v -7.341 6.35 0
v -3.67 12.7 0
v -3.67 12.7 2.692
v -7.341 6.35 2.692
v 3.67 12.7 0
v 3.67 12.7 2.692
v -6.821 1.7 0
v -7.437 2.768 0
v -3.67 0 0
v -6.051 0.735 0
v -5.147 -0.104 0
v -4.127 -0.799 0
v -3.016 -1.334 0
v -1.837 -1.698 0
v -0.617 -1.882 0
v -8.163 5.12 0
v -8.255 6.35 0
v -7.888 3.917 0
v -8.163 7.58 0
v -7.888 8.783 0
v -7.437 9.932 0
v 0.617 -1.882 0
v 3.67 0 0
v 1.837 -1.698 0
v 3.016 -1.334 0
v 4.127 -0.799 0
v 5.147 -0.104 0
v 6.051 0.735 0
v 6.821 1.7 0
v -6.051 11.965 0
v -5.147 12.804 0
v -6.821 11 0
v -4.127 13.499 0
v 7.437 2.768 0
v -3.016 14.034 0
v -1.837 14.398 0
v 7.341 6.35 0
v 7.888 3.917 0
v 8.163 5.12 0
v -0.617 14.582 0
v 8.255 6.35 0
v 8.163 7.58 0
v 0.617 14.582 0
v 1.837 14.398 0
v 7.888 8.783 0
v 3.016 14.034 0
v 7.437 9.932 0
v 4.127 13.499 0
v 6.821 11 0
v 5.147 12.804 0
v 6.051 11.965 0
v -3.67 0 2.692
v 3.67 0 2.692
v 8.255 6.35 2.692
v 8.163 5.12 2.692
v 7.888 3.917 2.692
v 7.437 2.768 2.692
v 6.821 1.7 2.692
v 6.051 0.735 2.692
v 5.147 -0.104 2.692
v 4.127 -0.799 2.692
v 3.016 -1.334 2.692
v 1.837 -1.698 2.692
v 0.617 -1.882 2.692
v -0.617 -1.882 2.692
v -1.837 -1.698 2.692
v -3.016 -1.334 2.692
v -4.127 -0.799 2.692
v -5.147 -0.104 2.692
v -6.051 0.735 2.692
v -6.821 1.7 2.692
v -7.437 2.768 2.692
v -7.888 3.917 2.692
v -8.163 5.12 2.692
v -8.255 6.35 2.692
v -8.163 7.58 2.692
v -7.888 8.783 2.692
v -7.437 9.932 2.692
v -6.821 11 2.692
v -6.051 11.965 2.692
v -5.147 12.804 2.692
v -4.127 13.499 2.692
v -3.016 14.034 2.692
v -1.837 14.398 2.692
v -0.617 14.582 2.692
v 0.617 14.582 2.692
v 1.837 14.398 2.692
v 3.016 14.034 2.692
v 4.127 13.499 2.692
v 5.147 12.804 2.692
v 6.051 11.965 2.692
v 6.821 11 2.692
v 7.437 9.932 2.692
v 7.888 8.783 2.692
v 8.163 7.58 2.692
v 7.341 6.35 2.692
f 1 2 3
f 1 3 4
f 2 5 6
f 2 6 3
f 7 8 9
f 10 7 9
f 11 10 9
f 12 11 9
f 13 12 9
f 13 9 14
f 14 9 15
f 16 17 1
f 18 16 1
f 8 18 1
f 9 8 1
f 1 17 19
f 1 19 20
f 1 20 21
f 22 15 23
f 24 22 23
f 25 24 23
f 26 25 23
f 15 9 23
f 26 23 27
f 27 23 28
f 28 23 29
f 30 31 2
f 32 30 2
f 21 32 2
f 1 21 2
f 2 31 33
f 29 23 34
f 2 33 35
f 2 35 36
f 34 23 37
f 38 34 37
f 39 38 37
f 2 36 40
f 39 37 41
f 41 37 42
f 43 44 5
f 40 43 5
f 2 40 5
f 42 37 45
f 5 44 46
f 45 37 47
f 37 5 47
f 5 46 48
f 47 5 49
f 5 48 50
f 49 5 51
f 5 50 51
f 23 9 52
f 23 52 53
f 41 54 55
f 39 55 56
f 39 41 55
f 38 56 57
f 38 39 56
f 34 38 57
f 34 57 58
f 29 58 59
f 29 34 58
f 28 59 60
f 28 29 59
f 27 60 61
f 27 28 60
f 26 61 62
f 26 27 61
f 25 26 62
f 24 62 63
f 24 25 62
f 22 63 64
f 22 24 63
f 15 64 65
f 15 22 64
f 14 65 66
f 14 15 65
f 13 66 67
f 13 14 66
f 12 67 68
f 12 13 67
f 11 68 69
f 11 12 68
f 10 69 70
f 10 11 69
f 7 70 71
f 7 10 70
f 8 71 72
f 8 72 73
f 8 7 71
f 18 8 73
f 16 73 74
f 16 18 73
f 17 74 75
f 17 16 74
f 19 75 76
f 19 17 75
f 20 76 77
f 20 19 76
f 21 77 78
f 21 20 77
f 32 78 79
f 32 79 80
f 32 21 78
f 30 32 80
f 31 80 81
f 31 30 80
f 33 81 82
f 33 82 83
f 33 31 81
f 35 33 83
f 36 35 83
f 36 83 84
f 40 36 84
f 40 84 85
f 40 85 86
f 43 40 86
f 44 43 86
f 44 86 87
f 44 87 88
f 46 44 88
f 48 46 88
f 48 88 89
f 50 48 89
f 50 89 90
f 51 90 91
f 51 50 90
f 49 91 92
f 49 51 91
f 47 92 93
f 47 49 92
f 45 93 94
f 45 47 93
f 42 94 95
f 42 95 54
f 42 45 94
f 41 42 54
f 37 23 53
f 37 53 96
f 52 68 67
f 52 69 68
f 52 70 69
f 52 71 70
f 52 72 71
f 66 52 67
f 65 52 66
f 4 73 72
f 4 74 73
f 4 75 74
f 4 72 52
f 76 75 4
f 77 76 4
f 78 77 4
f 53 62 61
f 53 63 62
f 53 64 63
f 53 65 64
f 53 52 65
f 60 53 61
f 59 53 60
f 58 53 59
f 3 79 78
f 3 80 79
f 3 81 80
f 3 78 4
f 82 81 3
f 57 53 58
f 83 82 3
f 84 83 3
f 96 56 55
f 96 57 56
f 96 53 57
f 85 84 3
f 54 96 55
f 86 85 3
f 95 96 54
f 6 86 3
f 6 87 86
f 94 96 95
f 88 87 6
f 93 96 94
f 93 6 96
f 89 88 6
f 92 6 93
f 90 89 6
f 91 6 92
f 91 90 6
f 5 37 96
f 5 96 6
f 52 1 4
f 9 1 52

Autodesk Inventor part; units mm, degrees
ref_plane "YZ Plane" through (0, 0, 0) normal (1, 0, 0) x (0, 1, 0)
ref_plane "XZ Plane" through (0, 0, 0) normal (0, 1, 0) x (-1, 0, 0)
ref_plane "XY Plane" through (0, 0, 0) normal (0, 0, 1) x (1, 0, 0)
sketch "Sketch2" plane through (0, 0, 0) normal (0, 0, 1) x (1, 0, 0)
  line L0 (0, 12.7) -> (3.6703, 12.7)
  line L1 (0, 12.7) -> (-3.6703, 12.7)
  line L2 (0, 0) -> (3.6703, 0)
  line L3 (0, 0) -> (-3.6703, 0)
  line L4 (-3.6703, 0) -> (-7.3406, 6.35)
  line L5 (-7.3406, 6.35) -> (-3.6703, 12.7)
  line L6 (3.6703, 12.7) -> (7.3406, 6.35)
  line L7 (7.3406, 6.35) -> (3.6703, 0)
  line L8 (0, 0) -> (0, 6.35)
  circle A0 centre (0, 6.35) radius 8.255
  dimension "d11" = 6.35
  dimension "d12" = 16.51
extrude "Extrusion2" add sketch "Sketch2" along normal blind 6.223
sketch "Sketch3" plane through (0, 6.35, 6.223) normal (0, 0, 1) x (1, 0, 0)
  line L0 (-3.6703, -6.35) -> (-7.3406, 0) projected
  line L1 (-7.3406, 0) -> (-3.6703, 6.35) projected
  line L2 (-3.6703, 6.35) -> (3.6703, 6.35) projected
  line L3 (3.6703, 6.35) -> (7.3406, 0) projected
  line L4 (7.3406, 0) -> (3.6703, -6.35) projected
  line L5 (3.6703, -6.35) -> (-3.6703, -6.35) projected
  circle A0 centre (0, 0) radius 8.255 projected
  point P0 (0, -6.35)
extrude "Extrusion3" add sketch "Sketch3" along normal blind 3.302
sketch "Sketch4" plane through (0, 6.35, 9.525) normal (0, 0, 1) x (1, 0, 0)
  line L0 (-7.3406, 0) -> (-3.6703, 6.35) projected
  line L1 (-3.6703, 6.35) -> (3.6703, 6.35) projected
  line L2 (3.6703, 6.35) -> (7.3406, 0) projected
  line L3 (7.3406, 0) -> (3.6703, -6.35) projected
  line L4 (3.6703, -6.35) -> (-3.6703, -6.35) projected
  line L5 (-3.6703, -6.35) -> (-7.3406, 0) projected
  circle A0 centre (0, 0) radius 8.255 projected
  point P0 (0, -6.35)
extrude "Extrusion4" add sketch "Sketch4" along normal blind 6.5786
sketch "Sketch5" plane through (0, 6.35, 16.1036) normal (0, 0, 1) x (1, 0, 0)
  line L0 (-16.3467, 15.7745) -> (15.1254, 15.7745)
  line L1 (15.1254, 15.7745) -> (15.1254, -12.8793)
  line L2 (15.1254, -12.8793) -> (-16.3467, -12.8793)
  line L3 (-16.3467, -12.8793) -> (-16.3467, 15.7745)
  point P0 (0, -6.35)
extrude "Extrusion5" cut sketch "Sketch5" against normal blind 6.5786
sketch "Sketch8" plane through (0, 6.35, 9.525) normal (0, 0, 1) x (1, 0, 0)
  line L0 (-7.3406, 0) -> (-3.6703, -6.35) projected
  line L1 (-3.6703, 6.35) -> (-7.3406, 0) projected
  line L2 (3.6703, 6.35) -> (-3.6703, 6.35) projected
  line L3 (7.3406, 0) -> (3.6703, 6.35) projected
  line L4 (3.6703, -6.35) -> (7.3406, 0) projected
  line L5 (-3.6703, -6.35) -> (3.6703, -6.35) projected
  circle A0 centre (0, 0) radius 8.255 projected
  point P0 (0, -6.35)
extrude "Extrusion7" add sketch "Sketch8" along normal blind 15.875
sketch "Sketch9" plane through (0, 6.35, 25.4) normal (0, 0, 1) x (1, 0, 0)
  line L0 (-7.3406, 0) -> (-3.6703, 6.35) projected
  line L1 (-3.6703, 6.35) -> (3.6703, 6.35) projected
  line L2 (3.6703, 6.35) -> (7.3406, 0) projected
  line L3 (7.3406, 0) -> (3.6703, -6.35) projected
  line L4 (3.6703, -6.35) -> (-3.6703, -6.35) projected
  line L5 (-3.6703, -6.35) -> (-7.3406, 0) projected
  circle A0 centre (0, 0) radius 8.255 projected
  point P0 (0, -6.35)
extrude "Extrusion8" cut sketch "Sketch9" against normal blind 21.7424
sketch "Sketch10" plane through (0, 6.35, 3.6576) normal (0, 0, 1) x (1, 0, 0)
  line L0 (-7.3406, 0) -> (-3.6703, -6.35) projected
  line L1 (-3.6703, 6.35) -> (-7.3406, 0) projected
  line L2 (3.6703, 6.35) -> (-3.6703, 6.35) projected
  line L3 (7.3406, 0) -> (3.6703, 6.35) projected
  line L4 (3.6703, -6.35) -> (7.3406, 0) projected
  line L5 (-3.6703, -6.35) -> (3.6703, -6.35) projected
  circle A0 centre (0, 0) radius 8.255 projected
  point P0 (0, -6.35)
extrude "Extrusion9" add sketch "Sketch10" along normal blind 9.1948
sketch "Sketch11" plane through (0, 6.35, 12.8524) normal (0, 0, 1) x (1, 0, 0)
  line L0 (-10.961, 11.9872) -> (13.8218, 11.9872)
  line L1 (13.8218, 11.9872) -> (13.8218, -11.21)
  line L2 (13.8218, -11.21) -> (-10.961, -11.21)
  line L3 (-10.961, -11.21) -> (-10.961, 11.9872)
  point P0 (0, -6.35)
extrude "Extrusion10" cut sketch "Sketch11" against normal blind 10.16
properties part number ".106Spacer"
